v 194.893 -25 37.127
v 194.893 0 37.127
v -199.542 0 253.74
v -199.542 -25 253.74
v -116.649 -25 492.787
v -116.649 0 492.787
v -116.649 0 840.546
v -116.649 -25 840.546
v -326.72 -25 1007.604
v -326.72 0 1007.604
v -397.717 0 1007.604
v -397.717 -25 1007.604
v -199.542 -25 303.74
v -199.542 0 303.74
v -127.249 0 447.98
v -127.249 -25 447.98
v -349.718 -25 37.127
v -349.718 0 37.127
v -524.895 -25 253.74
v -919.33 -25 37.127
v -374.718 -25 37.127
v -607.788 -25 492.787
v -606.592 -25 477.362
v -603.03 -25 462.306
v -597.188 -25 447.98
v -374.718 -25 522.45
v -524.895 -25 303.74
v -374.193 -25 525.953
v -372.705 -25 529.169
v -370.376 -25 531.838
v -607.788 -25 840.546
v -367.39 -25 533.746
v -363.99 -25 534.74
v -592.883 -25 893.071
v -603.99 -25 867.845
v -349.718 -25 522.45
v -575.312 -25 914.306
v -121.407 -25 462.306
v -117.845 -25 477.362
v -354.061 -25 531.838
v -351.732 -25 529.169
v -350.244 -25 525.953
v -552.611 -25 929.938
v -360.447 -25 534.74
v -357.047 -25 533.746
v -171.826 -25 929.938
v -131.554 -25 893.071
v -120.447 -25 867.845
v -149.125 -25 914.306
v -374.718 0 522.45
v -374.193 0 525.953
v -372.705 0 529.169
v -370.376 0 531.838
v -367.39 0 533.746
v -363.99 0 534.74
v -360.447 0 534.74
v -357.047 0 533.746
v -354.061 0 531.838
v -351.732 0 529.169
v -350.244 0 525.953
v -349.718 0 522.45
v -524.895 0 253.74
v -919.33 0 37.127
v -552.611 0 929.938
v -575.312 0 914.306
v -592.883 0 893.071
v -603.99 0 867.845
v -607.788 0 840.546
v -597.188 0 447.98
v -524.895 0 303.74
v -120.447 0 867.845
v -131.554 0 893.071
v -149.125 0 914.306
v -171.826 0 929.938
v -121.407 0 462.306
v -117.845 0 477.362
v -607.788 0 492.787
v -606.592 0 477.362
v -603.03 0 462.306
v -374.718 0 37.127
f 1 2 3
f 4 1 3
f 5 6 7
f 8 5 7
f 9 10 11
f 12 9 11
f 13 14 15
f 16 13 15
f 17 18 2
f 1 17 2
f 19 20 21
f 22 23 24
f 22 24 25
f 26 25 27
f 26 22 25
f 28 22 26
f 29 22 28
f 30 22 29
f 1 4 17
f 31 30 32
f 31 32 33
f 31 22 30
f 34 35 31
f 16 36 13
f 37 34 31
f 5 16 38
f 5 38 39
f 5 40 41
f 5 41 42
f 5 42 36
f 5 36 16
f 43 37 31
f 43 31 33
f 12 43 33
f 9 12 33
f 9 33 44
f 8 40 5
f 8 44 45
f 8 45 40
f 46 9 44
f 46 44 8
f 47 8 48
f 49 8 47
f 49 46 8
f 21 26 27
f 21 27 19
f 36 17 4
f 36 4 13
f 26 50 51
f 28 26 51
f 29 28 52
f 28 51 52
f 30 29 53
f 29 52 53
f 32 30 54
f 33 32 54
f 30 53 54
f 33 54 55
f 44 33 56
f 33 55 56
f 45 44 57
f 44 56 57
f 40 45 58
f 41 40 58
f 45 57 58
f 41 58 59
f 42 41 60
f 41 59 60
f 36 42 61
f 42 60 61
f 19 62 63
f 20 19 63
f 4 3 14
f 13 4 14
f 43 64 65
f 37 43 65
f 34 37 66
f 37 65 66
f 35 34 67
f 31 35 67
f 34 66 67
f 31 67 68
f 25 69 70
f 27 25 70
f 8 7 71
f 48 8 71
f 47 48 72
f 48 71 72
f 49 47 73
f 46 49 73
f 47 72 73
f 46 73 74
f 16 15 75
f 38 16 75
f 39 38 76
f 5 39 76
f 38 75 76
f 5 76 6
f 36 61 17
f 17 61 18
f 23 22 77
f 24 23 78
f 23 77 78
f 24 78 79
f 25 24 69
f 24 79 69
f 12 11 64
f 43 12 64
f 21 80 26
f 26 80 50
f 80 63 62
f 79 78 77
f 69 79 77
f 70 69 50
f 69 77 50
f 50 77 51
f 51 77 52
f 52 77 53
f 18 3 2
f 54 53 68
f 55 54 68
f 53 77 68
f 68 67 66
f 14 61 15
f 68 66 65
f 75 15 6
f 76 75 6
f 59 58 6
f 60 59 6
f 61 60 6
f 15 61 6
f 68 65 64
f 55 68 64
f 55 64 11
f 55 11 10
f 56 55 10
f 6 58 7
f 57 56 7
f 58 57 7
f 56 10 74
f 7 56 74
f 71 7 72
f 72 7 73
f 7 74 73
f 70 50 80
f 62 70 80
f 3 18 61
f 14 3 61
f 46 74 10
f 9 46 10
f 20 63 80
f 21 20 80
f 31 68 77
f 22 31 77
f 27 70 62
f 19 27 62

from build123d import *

# Parameters (mm, degrees)
F1_DEPTH = 25


with BuildPart() as f1:
    # F0 (on Front) → F1 (new body)
    with BuildSketch(Plane.XZ):
        with BuildLine():
            Line((-349.718489, 37.126835), (194.89311, 37.126835))
            Line((194.89311, 37.126835), (-199.541794, 253.739637))
            Line((-199.541794, 253.739637), (-199.541794, 303.739637))
            Line((-199.541794, 303.739637), (-127.248838, 447.979555))
            ThreePointArc((-127.248838, 447.979555), (-119.334756, 469.764715), (-116.648626, 492.786673))
            Line((-116.648626, 492.786673), (-116.648626, 840.545695))
            ThreePointArc((-116.648626, 840.545695), (-131.553761, 893.070584), (-171.825906, 929.937661))
            Line((-171.825906, 929.937661), (-326.719748, 1007.604186))
            Line((-326.719748, 1007.604186), (-397.71723, 1007.604186))
            Line((-397.71723, 1007.604186), (-552.611073, 929.937661))
            ThreePointArc((-552.611073, 929.937661), (-592.883217, 893.070584), (-607.788352, 840.545695))
            Line((-607.788352, 840.545695), (-607.788352, 492.786673))
            ThreePointArc((-607.788352, 492.786673), (-605.102223, 469.764715), (-597.188141, 447.979555))
            Line((-597.188141, 447.979555), (-524.895184, 303.739637))
            Line((-524.895184, 303.739637), (-524.895184, 253.739637))
            Line((-524.895184, 253.739637), (-919.330089, 37.126835))
            Line((-919.330089, 37.126835), (-374.718489, 37.126835))
            Line((-374.718489, 37.126835), (-374.718489, 522.281469))
            ThreePointArc((-374.718489, 522.281469), (-374.718772, 522.365511), (-374.718489, 522.449553))
            ThreePointArc((-374.718489, 522.449553), (-362.218489, 534.865793), (-349.718489, 522.449553))
            ThreePointArc((-349.718489, 522.449553), (-349.718207, 522.365511), (-349.718489, 522.281469))
            Line((-349.718489, 522.281469), (-349.718489, 37.126835))
        make_face()
        with BuildLine():
            Line((-349.718489, 522.449553), (-349.718489, 522.281469))
            ThreePointArc((-349.718489, 522.281469), (-349.718207, 522.365511), (-349.718489, 522.449553))
        make_face()
        with BuildLine():
            Line((-374.718489, 522.281469), (-374.718489, 522.449553))
            ThreePointArc((-374.718489, 522.449553), (-374.718772, 522.365511), (-374.718489, 522.281469))
        make_face()
    extrude(amount=F1_DEPTH)


solid = f1.part
